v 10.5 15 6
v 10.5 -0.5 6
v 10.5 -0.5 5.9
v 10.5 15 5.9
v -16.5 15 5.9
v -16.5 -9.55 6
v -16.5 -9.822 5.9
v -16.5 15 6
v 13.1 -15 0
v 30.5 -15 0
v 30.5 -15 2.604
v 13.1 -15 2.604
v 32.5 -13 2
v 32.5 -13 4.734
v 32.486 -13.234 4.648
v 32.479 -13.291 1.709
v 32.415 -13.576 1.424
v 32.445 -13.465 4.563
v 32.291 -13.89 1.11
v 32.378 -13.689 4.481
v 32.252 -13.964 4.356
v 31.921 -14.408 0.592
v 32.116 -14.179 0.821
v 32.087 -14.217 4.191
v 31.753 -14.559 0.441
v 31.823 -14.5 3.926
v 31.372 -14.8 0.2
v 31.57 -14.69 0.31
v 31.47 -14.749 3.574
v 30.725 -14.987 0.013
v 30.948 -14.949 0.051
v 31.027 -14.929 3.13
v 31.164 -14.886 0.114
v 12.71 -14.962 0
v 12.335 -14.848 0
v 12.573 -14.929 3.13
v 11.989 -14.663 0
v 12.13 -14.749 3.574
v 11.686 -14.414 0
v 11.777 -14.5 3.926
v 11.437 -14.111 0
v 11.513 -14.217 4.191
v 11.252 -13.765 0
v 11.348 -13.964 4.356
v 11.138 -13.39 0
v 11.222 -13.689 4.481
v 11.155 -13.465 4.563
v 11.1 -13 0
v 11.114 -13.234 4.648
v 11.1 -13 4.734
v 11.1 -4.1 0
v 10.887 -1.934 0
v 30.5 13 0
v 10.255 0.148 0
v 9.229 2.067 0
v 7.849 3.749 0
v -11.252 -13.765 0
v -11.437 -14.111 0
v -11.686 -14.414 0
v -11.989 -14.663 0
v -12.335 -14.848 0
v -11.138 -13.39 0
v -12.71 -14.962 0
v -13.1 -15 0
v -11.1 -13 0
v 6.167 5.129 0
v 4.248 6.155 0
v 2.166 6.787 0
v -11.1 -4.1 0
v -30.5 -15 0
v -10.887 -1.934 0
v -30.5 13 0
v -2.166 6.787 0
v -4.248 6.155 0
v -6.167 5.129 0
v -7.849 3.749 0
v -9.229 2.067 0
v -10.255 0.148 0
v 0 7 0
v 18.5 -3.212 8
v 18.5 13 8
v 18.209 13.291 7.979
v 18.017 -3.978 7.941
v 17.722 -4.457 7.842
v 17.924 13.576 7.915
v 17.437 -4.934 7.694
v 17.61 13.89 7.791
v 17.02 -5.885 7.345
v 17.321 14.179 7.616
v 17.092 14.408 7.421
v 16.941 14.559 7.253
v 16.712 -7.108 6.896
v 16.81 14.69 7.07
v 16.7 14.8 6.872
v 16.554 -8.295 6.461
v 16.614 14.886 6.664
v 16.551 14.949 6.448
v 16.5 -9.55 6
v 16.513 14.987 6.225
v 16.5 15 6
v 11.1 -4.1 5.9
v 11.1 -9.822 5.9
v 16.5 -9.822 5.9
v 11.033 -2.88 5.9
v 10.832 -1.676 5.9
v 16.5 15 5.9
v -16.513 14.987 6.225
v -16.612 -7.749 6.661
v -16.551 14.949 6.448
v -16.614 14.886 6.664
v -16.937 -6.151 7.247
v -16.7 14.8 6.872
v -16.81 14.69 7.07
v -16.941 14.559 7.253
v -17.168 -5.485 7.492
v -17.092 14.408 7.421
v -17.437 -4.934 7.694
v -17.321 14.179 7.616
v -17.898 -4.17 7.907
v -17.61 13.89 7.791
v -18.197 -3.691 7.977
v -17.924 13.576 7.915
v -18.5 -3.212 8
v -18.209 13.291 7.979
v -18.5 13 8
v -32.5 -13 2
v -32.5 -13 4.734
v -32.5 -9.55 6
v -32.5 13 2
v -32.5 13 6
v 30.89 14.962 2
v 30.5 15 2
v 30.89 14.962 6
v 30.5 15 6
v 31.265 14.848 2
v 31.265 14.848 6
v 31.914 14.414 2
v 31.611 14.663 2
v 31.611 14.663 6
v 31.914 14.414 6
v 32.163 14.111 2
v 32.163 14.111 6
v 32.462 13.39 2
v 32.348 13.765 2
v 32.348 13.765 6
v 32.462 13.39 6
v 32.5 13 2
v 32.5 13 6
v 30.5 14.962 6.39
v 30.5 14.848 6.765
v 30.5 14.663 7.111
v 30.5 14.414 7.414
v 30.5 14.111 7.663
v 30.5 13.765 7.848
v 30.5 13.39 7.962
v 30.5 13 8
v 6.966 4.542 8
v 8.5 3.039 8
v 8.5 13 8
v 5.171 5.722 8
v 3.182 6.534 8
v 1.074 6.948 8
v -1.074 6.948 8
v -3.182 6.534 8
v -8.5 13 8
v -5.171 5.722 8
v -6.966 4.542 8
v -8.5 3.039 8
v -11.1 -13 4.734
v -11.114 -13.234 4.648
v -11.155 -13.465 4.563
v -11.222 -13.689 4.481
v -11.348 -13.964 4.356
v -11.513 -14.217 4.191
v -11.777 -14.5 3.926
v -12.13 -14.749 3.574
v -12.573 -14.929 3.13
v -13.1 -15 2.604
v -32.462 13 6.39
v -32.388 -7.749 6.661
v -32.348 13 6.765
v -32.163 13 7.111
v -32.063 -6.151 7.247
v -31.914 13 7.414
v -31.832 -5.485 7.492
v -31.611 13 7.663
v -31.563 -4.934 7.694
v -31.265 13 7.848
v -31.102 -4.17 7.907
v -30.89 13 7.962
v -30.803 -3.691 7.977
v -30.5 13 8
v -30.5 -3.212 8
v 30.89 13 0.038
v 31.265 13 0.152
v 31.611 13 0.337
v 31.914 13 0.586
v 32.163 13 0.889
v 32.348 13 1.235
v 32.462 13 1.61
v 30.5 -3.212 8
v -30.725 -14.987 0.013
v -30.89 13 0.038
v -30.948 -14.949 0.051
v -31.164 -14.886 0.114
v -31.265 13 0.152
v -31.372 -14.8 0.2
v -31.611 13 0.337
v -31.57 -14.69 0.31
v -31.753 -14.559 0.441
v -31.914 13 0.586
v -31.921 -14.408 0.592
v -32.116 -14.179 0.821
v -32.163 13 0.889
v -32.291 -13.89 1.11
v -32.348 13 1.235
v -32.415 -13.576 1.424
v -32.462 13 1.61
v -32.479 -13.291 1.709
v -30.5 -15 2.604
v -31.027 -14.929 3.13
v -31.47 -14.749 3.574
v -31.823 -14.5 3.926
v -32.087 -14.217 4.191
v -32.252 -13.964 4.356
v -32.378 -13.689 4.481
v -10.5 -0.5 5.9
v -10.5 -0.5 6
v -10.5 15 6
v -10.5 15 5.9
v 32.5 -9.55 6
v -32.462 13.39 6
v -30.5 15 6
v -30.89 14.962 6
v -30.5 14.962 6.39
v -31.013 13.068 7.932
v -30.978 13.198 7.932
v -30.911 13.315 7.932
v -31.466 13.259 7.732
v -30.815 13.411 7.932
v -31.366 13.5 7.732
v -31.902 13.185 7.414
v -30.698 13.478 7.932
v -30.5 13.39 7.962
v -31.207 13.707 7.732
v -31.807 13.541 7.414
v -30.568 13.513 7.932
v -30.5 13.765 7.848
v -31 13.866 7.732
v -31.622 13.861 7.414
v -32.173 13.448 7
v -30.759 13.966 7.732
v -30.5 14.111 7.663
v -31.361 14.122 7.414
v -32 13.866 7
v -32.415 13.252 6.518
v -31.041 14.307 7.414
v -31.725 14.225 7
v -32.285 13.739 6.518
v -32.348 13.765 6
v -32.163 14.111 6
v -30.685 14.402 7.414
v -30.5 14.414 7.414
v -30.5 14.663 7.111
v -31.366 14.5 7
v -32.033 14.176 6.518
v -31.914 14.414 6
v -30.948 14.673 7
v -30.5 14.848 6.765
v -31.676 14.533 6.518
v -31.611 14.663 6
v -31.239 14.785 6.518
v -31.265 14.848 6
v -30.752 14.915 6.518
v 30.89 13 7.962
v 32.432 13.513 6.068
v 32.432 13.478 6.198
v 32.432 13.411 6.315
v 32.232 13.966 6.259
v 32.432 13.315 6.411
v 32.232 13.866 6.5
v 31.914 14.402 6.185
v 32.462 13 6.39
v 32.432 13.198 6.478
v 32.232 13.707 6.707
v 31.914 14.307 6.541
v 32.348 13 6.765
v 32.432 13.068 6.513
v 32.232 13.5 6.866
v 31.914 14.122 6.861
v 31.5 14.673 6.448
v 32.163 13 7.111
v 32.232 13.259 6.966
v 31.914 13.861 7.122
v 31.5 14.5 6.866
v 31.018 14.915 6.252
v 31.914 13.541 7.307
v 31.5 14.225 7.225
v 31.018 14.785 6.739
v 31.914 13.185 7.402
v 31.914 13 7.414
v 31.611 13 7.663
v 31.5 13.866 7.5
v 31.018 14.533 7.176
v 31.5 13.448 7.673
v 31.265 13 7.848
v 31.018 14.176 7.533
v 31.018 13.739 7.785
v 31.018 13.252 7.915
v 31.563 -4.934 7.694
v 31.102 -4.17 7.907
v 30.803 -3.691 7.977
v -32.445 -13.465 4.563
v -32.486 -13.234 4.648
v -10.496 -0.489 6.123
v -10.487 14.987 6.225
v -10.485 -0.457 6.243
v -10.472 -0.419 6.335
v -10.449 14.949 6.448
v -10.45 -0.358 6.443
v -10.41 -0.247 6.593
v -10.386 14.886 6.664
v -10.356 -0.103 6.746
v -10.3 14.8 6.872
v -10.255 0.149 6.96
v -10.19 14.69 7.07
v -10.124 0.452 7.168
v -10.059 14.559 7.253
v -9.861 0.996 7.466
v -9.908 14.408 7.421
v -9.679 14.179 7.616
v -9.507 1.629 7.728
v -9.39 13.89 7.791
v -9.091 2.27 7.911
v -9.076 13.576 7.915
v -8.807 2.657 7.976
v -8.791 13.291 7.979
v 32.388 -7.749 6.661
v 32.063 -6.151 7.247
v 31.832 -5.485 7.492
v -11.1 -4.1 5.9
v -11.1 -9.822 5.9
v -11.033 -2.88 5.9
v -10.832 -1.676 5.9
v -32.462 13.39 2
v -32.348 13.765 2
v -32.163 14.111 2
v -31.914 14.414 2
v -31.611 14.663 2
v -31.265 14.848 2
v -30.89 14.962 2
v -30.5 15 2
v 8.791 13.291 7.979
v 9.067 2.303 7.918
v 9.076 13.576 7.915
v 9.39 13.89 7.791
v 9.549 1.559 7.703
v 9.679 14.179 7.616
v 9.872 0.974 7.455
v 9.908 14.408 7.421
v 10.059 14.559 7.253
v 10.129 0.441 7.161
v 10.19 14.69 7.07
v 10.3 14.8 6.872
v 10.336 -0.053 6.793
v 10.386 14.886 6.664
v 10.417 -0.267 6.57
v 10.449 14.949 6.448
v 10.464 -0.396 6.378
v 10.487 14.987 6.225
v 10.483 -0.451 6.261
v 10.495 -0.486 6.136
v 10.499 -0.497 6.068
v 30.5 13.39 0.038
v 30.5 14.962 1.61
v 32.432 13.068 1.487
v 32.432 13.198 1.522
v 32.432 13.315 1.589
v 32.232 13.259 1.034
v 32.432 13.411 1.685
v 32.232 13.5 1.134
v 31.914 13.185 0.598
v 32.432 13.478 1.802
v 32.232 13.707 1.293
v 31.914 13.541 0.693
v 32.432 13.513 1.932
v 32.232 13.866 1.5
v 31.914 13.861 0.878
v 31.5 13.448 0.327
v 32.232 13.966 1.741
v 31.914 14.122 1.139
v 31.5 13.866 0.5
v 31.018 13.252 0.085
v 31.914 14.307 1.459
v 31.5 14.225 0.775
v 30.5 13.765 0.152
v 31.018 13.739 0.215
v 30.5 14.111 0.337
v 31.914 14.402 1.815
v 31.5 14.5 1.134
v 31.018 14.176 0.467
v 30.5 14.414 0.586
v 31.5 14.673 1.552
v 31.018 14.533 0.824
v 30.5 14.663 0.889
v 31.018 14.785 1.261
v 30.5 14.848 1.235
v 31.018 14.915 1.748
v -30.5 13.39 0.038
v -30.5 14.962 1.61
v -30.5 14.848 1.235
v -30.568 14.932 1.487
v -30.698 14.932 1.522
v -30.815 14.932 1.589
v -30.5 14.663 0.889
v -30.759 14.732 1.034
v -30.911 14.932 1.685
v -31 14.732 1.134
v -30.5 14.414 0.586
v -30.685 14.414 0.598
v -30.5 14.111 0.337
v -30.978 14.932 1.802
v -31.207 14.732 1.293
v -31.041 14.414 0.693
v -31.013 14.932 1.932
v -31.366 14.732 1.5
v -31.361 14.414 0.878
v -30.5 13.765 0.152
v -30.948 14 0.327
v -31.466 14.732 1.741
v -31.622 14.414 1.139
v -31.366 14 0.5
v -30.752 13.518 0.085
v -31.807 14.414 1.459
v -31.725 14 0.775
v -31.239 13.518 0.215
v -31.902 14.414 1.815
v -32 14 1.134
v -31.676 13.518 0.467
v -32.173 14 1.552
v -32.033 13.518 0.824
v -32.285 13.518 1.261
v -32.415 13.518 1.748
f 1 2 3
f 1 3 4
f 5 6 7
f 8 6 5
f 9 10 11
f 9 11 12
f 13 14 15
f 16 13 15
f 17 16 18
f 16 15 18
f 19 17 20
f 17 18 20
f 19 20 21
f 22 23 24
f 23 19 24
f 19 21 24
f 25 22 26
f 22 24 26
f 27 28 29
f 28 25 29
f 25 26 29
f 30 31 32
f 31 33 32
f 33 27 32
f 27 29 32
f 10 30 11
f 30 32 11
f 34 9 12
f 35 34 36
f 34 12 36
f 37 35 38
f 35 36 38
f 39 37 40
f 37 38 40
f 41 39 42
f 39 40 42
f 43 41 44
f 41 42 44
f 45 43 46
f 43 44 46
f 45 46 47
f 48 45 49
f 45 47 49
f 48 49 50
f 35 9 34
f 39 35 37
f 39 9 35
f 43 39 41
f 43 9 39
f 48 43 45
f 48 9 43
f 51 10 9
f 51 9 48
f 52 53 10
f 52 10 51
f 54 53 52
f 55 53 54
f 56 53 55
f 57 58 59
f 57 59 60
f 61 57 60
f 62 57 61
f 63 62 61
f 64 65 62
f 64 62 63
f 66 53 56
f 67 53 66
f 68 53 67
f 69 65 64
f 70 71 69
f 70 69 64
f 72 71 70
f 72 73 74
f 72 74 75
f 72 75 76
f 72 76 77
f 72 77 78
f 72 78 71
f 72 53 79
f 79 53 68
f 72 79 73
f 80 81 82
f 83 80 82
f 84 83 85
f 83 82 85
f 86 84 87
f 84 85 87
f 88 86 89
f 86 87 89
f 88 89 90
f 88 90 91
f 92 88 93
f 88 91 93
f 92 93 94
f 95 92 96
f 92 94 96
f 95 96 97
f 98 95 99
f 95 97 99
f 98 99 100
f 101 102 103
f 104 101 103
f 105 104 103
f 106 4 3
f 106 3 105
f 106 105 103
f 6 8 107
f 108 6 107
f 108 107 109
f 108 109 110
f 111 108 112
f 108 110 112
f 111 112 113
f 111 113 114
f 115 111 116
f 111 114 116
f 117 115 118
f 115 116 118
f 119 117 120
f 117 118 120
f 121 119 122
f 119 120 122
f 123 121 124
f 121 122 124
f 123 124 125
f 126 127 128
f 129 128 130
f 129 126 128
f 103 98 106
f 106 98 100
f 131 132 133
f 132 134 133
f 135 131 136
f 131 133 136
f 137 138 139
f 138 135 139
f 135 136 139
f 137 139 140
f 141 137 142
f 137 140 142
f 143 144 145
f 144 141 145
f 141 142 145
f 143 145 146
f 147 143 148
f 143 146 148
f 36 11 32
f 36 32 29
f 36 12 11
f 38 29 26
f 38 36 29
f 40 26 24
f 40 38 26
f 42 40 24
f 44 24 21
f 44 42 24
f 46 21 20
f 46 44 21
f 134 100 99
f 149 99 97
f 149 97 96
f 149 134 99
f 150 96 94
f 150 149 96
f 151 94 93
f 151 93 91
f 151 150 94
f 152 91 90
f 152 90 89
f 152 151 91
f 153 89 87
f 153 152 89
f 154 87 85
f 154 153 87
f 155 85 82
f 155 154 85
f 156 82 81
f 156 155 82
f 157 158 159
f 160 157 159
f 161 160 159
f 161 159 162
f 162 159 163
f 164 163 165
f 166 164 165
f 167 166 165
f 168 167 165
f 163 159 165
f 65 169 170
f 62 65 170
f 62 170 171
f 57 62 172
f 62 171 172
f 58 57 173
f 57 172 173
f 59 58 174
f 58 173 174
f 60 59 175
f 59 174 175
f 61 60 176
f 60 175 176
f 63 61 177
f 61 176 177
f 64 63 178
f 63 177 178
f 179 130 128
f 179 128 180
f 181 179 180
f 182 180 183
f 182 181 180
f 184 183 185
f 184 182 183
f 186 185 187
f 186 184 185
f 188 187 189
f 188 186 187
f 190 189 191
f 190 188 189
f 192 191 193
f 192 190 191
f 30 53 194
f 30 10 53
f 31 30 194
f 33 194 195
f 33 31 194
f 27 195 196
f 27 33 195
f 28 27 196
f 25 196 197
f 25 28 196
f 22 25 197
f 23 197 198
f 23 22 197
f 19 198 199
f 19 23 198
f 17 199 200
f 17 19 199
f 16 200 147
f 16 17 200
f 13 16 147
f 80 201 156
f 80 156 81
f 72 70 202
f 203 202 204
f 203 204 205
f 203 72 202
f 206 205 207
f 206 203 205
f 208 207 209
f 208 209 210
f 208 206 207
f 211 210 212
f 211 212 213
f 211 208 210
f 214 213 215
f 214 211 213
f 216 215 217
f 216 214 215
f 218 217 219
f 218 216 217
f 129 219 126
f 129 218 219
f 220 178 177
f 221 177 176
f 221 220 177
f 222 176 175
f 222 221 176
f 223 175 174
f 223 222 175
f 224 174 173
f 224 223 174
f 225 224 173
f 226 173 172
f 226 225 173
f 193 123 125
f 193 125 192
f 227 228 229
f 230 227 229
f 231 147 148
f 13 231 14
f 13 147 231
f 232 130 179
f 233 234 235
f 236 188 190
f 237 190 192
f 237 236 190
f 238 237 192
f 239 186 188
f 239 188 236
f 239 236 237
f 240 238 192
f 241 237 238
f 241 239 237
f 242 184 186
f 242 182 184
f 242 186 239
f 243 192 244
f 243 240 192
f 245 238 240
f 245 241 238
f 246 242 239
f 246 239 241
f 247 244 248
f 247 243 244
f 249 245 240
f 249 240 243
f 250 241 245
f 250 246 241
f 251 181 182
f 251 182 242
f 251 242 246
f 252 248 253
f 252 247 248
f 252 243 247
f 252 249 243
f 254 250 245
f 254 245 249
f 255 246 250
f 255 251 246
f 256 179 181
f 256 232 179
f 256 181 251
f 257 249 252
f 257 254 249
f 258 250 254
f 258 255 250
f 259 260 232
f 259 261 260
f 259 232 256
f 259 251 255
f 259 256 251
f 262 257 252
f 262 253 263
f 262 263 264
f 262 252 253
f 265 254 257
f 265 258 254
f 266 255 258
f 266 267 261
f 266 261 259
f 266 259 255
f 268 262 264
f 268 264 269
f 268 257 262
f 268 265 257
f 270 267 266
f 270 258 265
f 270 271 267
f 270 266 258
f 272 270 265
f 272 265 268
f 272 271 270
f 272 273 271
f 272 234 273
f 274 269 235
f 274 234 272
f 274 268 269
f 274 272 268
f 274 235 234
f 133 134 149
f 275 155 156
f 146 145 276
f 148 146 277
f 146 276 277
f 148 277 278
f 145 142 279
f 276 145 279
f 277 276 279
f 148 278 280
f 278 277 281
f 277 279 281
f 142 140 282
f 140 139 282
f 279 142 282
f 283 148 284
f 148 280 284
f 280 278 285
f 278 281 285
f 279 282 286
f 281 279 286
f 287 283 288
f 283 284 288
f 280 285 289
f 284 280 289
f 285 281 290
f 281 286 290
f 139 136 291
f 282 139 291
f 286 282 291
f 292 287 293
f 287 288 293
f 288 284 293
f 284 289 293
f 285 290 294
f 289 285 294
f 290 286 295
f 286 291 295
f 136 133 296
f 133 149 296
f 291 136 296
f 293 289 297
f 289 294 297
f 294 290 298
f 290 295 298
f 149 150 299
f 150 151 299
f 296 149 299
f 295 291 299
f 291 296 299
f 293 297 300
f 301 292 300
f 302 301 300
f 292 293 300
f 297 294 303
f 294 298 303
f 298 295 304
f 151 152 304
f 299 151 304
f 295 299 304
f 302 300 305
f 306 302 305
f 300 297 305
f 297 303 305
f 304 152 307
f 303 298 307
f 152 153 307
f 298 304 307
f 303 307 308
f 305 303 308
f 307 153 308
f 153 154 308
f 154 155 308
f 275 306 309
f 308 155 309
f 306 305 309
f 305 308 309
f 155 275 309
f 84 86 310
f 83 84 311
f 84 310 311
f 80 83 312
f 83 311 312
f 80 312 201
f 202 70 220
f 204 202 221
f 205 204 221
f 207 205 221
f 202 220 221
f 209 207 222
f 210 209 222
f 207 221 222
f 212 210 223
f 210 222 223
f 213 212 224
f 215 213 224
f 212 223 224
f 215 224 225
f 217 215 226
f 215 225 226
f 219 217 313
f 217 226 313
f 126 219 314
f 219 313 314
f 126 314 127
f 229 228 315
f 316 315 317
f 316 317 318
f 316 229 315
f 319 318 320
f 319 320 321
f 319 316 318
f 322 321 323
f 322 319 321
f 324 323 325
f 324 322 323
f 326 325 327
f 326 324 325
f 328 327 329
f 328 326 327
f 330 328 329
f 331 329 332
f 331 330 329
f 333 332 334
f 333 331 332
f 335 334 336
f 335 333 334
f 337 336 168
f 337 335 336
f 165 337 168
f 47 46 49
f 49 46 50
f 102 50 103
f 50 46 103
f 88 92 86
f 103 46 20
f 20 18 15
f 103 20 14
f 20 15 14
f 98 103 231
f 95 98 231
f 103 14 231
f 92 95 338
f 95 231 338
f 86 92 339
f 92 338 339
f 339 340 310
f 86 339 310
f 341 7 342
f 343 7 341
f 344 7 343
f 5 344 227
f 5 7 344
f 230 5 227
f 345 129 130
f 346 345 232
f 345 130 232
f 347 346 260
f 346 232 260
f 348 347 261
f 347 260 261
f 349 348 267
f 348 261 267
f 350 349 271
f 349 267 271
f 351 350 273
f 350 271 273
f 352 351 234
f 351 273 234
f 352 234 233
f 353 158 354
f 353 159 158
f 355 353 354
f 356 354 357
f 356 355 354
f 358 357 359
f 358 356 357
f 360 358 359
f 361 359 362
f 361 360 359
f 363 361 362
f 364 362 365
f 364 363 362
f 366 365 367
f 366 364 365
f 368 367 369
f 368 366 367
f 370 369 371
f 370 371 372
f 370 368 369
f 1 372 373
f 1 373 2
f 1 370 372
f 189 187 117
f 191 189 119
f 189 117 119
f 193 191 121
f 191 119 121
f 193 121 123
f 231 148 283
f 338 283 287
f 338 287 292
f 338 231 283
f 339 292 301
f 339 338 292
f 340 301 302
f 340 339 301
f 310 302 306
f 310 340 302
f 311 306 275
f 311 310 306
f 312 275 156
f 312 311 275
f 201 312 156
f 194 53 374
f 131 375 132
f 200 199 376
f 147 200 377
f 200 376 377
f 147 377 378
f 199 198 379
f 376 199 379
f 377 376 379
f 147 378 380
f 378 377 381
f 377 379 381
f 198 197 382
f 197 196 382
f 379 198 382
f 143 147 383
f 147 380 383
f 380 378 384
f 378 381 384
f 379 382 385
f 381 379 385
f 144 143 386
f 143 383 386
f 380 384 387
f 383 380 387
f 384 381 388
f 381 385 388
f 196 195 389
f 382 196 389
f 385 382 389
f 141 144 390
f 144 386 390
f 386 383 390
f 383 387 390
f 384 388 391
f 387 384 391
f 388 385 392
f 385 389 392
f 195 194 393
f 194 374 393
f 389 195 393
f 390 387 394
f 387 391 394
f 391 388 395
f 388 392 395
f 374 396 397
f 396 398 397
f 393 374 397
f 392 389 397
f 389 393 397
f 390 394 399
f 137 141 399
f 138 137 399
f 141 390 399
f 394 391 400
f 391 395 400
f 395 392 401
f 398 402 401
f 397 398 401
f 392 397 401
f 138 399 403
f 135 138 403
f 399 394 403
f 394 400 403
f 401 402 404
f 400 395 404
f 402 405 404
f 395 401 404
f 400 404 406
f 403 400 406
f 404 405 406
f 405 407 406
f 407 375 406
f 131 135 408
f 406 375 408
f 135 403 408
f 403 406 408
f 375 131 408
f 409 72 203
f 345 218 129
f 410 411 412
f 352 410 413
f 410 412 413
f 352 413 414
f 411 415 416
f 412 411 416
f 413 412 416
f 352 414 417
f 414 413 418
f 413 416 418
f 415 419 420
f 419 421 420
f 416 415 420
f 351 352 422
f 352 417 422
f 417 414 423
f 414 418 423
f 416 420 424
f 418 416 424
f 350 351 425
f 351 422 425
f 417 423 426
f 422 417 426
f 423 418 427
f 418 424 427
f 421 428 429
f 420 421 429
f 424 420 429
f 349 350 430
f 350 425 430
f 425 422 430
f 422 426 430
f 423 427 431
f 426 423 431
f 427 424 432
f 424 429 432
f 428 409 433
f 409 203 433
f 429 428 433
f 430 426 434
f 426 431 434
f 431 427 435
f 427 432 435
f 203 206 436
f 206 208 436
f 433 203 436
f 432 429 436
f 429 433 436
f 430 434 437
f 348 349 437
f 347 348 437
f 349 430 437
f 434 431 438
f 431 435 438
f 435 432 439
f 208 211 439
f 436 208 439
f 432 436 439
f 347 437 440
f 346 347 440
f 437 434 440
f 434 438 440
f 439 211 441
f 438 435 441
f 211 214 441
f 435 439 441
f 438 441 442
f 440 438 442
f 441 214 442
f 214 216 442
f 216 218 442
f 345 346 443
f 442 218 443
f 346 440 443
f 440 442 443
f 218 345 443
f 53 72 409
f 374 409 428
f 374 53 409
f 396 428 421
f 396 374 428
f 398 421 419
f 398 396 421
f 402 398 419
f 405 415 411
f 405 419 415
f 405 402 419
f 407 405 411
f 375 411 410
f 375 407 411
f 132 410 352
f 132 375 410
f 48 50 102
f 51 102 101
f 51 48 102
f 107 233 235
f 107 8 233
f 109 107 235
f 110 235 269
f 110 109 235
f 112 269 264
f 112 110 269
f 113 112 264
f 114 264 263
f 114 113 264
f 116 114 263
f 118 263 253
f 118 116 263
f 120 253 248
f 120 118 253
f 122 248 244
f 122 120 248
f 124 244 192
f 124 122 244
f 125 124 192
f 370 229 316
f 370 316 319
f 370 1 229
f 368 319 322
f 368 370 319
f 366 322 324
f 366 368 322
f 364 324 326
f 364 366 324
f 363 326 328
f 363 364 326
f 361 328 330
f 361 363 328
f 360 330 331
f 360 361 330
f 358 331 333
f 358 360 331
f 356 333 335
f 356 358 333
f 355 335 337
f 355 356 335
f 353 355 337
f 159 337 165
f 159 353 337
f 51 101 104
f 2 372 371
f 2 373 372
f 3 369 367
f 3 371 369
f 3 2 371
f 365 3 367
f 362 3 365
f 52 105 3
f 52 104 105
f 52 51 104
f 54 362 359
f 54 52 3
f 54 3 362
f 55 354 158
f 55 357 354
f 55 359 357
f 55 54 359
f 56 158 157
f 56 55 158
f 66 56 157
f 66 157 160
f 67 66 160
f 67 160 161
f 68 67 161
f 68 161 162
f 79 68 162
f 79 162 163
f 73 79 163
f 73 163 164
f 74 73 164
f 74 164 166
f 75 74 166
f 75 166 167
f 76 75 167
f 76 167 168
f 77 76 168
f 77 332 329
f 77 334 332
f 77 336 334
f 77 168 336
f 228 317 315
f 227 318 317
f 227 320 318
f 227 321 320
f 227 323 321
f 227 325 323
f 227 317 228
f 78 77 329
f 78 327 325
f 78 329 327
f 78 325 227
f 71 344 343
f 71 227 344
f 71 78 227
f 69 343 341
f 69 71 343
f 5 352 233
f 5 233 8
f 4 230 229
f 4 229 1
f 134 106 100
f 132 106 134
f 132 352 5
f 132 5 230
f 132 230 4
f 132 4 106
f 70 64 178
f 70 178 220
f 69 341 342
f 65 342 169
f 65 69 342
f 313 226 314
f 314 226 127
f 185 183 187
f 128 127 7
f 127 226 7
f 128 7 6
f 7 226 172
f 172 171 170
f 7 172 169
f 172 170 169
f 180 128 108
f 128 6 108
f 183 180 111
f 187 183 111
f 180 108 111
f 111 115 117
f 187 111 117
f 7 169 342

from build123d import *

# Parameters (mm, degrees)
EXTRUDE_1_DEPTH     = 8
SKETCH_3_W          = 6
SKETCH_3_H          = 30
CUT_EXTRUDE_2_DEPTH = 2.1
CUT_EXTRUDE_3_DEPTH = 68.186308129
FILLET_1_R          = 2
FILLET_2_R          = 5


with BuildPart() as part:
    # 草图1 → 凸台-拉伸1 (new body)
    with BuildSketch(Plane.XY):
        with BuildLine():
            Line((-11.1, -4.1), (-11.1, -15))
            Line((-11.1, -15), (-32.5, -15))
            Line((-32.5, -15), (-32.5, 15))
            Line((-32.5, 15), (32.5, 15))
            Line((32.5, 15), (32.5, -15))
            Line((32.5, -15), (11.1, -15))
            Line((11.1, -15), (11.1, -4.1))
            ThreePointArc((11.1, -4.1), (0, 7), (-11.1, -4.1))
        make_face()
    extrude(amount=EXTRUDE_1_DEPTH)

    # 草图3 → 切除-拉伸2 (cut)
    with BuildSketch(Plane.XY.offset(8)):
        with Locations((-13.5, 0)):
            Rectangle(SKETCH_3_W, SKETCH_3_H)
        with Locations((13.5, 0)):
            Rectangle(SKETCH_3_W, SKETCH_3_H)
    extrude(amount=-CUT_EXTRUDE_2_DEPTH, mode=Mode.SUBTRACT)

    # 草图2 → 切除-拉伸3 (cut, through all)
    with BuildSketch(Plane(origin=(32.5, 0, 0), x_dir=(0, 0, -1), z_dir=(1, 0, 0))):
        Polygon((-4, -15), (-8, -4.1), (-8, -15), align=None)
    extrude(amount=-CUT_EXTRUDE_3_DEPTH, mode=Mode.SUBTRACT)

    # 圆角1
    fillet_1_edges = [part.edges().sort_by_distance(p)[0] for p in [
        (-32.5, 0, 0),
        (0, 15, 0),
        (32.5, 0, 0),
        (24.5, 15, 8),
        (-32.5, 15, 4),
        (32.5, 15, 4),
        (-32.5, 5.45, 8),
        (0, 15, 8),
        (-24.5, 15, 8),
        (-10.5, 7.25, 8),
        (-16.5, 5.45, 8),
        (10.5, 7.25, 8),
        (16.5, 5.45, 8),
        (11.1, -15, 2),
        (-32.5, -15, 2),
        (-11.1, -15, 2),
        (32.5, 5.45, 8),
        (32.5, -15, 2),
        (21.8, -15, 4),
        (-21.8, -15, 4),
    ]]
    fillet(fillet_1_edges, radius=FILLET_1_R)

    # 圆角2
    # the kernel refuses this fillet: 5 mm, written as the material it takes off along each edge
    with BuildSketch(Plane(origin=(32.721158942, -4.1, 8), x_dir=(0, -0.9387834907734438, -0.34450770303612566), z_dir=(-1, 0, 0)), Plane(origin=(-16.278841058, -4.1, 8), x_dir=(0, -0.9387834907734438, -0.34450770303612566), z_dir=(-1, 0, 0))) as fillet_2_piece_1:
        with BuildLine():
            CenterArc((FILLET_2_R * 0.177692715394, -FILLET_2_R), FILLET_2_R, 90, 20.151747034)
            Line((-FILLET_2_R * 0.166814987642, -FILLET_2_R * 0.0612165092266), (0, 0))
            Line((0, 0), (FILLET_2_R * 0.177692715394, 0))
        make_face()
    extrude(amount=16.442317885, mode=Mode.SUBTRACT)


solid = part.part
